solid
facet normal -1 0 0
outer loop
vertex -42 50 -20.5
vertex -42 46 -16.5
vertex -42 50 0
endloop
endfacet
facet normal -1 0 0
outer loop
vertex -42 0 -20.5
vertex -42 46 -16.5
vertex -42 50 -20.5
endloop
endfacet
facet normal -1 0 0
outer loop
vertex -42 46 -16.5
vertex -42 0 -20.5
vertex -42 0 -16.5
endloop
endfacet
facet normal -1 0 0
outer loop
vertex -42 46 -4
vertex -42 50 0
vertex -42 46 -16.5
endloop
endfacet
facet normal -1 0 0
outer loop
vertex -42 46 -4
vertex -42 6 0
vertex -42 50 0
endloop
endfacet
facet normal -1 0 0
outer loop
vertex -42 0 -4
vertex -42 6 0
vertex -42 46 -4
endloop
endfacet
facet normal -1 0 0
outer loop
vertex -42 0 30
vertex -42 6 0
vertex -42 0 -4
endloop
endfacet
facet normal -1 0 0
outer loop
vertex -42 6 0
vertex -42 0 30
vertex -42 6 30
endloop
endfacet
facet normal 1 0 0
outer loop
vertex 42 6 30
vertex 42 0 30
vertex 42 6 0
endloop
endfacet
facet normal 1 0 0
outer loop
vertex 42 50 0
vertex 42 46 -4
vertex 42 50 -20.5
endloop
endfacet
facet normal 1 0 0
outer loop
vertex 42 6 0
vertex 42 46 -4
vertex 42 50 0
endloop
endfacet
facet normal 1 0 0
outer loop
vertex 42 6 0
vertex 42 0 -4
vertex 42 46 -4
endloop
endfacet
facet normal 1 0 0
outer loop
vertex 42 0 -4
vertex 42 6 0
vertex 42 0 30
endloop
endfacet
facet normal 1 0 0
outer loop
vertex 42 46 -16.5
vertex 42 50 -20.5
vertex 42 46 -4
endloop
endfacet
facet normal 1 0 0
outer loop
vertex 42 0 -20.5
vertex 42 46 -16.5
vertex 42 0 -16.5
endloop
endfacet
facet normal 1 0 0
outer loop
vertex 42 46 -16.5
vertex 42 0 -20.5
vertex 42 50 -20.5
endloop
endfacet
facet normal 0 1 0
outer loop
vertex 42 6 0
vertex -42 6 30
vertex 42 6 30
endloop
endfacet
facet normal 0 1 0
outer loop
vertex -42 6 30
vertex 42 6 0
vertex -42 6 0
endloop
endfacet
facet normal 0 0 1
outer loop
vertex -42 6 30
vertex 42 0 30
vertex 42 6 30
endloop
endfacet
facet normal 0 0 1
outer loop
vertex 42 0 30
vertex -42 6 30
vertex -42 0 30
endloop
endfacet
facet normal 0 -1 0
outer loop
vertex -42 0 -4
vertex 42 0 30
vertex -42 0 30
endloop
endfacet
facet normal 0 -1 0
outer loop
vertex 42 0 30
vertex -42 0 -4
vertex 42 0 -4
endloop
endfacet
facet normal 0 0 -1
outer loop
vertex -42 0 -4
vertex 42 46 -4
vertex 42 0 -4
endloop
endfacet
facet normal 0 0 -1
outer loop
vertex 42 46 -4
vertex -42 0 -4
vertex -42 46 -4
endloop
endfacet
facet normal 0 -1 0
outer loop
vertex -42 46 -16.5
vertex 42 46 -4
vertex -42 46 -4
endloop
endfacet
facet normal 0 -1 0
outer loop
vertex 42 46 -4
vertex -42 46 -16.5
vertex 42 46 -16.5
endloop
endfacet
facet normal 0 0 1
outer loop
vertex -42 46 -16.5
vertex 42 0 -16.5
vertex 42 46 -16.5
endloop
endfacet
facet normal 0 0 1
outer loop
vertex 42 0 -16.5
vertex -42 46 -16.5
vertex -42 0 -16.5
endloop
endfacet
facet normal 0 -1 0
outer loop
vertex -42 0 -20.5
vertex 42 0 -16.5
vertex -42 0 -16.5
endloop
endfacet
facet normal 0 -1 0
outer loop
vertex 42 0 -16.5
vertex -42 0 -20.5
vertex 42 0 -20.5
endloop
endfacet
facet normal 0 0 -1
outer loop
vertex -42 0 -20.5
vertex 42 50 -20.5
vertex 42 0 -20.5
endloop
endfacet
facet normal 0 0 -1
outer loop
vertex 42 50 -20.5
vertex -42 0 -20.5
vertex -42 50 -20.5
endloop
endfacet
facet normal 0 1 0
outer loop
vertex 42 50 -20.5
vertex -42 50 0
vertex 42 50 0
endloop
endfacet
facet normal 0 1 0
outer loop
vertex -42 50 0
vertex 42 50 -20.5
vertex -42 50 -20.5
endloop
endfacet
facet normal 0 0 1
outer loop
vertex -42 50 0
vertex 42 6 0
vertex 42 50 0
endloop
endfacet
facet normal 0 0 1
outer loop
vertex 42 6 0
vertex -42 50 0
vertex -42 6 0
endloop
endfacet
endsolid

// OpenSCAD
// PCR Strip Holder for Ice Bucket - Corrected Orientation
// Designed to hang over a 12mm wall and hold an 8-tube PCR strip.

// --- Dimensions ---
length_x      = 84.0;    // Extrusion length along X
wall_gap      = 12.5;    // Gap for the bucket wall (16.5 - 4.0 = 12.5)
inner_leg_h    = 50.0;    // Height of the inner leg
outer_leg_h    = 50.0;    // Height of the outer leg
leg_thickness  = 4.0;     // Thickness of the legs (20.5 - 16.5 = 4.0)
bridge_h       = 4.0;     // Height of the top bridge (50 - 46 = 4)
ledge_thick    = 6.0;     // Thickness of the ledge (z = 0 to 6)
ledge_depth    = 30.0;    // Depth of the ledge into the ice (y = 0 to -30)
tube_hole_d    = 6.4;     // Diameter of the PCR tube holes
tube_pitch     = 9.0;     // Spacing between tube holes along X
num_tubes      = 8;       // Number of tubes

$fn = 64;

// --- Construction ---

// We define the 2D profile in the YZ plane.
// To extrude along X, we must rotate the 2D shape 90 degrees around X
// so that the extrusion direction (Z) aligns with the X axis.
module profile_yz() {
    // Inner Leg: y from 0 to 4, z from 0 to 50
    square([4, inner_leg_h]);
    
    // Outer Leg: y from 16.5 to 20.5, z from 0 to 50
    translate([16.5, 0]) square([leg_thickness, outer_leg_h]);
    
    // Bridge: y from 4 to 16.5, z from 46 to 50
    translate([4, 46]) square([wall_gap, bridge_h]);
    
    // Ledge: y from -30 to 0, z from 0 to 6
    translate([-ledge_depth, 0]) square([ledge_depth, ledge_thick]);
}

// Final Assembly
difference() {
    // 1. Create the 3D body
    // We rotate the 2D profile 90 degrees around X so that the 
    // extrusion (Z) goes along the X axis.
    // Then we translate to center it on X.
    translate([-length_x / 2, 0, 0])
    rotate([0, 90, 0])
    linear_extrude(height = length_x) {
        profile_yz();
    }

    // 2. Subtract the tube holes
    // The holes are vertical (along Z).
    // In the extruded part, the "ledge" is now in the XZ plane.
    // The user wants holes at y = -15.
    // Because we rotated the profile, the original Y (ledge depth) 
    // is now the Z axis of the 3D part.
    // The original Z (height) is now the Y axis of the 3D part.
    // The original X (extrusion) is now the X axis of the 3D part.
    
    // Let's re-map based on the rotation:
    // Original Profile Y -> 3D Z
    // Original Profile Z -> 3D Y
    // Original Profile X -> 3D X
    
    // Ledge is at original Y = -30 to 0. In 3D, this is Z = -30 to 0.
    // Ledge thickness is original Z = 0 to 6. In 3D, this is Y = 0 to 6.
    // Tube position is original Y = -15. In 3D, this is Z = -15.
    // Tube holes are vertical (original Z). In 3D, this is Y.
    
    for (i = [0 : num_tubes - 1]) {
        // X position: centered on 0
        let (x_pos = (i - (num_tubes - 1) / 2) * tube_pitch)
        
        // Translate to hole location:
        // X: x_pos
        // Y: -1 (to ensure it cuts through the ledge height)
        // Z: -15 (the target Y position in the original profile)
        translate([x_pos, -1, -15]) 
            cylinder(h = 8, d = tube_hole_d);
    }
}
